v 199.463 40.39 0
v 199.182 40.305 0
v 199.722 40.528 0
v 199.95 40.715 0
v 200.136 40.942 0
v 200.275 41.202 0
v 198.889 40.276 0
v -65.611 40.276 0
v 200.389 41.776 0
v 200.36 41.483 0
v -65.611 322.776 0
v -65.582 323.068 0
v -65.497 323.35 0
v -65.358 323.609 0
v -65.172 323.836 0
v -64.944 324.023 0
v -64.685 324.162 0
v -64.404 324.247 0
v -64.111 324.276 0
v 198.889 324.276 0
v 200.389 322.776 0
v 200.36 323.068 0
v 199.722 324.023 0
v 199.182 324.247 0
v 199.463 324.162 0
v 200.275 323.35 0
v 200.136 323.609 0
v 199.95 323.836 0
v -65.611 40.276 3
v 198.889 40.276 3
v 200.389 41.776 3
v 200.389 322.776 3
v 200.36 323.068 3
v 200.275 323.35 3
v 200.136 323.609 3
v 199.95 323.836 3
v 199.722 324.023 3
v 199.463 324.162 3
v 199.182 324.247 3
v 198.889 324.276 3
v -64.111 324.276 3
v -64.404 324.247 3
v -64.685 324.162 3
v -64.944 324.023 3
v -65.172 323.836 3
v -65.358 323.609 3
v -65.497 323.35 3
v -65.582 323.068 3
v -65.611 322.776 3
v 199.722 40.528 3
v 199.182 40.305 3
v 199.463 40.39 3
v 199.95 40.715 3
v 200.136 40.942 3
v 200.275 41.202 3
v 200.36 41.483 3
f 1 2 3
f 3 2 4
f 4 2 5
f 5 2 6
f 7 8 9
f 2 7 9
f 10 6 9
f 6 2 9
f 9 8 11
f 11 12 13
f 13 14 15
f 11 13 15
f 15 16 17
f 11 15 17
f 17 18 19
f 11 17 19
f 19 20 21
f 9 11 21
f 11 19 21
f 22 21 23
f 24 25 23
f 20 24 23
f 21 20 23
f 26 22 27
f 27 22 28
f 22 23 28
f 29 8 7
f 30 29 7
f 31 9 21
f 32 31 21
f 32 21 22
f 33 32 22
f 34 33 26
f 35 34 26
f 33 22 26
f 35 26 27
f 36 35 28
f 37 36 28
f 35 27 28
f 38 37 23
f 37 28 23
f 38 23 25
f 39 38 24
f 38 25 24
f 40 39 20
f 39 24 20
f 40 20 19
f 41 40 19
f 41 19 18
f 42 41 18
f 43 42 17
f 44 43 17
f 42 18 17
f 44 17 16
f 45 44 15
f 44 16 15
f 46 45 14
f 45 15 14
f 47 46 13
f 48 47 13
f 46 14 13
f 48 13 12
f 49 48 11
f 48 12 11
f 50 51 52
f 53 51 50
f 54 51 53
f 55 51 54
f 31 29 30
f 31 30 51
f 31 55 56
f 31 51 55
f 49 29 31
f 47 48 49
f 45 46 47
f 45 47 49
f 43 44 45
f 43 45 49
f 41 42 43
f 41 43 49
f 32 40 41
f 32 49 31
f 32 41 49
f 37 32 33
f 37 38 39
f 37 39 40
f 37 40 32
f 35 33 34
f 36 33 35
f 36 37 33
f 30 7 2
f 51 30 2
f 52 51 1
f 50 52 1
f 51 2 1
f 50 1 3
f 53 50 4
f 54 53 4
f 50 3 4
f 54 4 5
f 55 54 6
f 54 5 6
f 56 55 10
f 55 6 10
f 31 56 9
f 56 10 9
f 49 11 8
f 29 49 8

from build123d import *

# Parameters (mm, degrees)
EXTRUDE_1_DEPTH = 3


with BuildPart() as part:
    # 草图1 → 凸台-拉伸1 (new body)
    with BuildSketch(Plane.XY):
        with BuildLine():
            Line((-65.611088087, 40.275681374), (198.888911913, 40.275681374))
            ThreePointArc((198.888911913, 40.275681374), (199.949572085, 40.715021202), (200.388911913, 41.775681374))
            Line((200.388911913, 41.775681374), (200.388911913, 322.775681374))
            ThreePointArc((200.388911913, 322.775681374), (199.949572085, 323.836341546), (198.888911913, 324.275681374))
            Line((198.888911913, 324.275681374), (-64.111088087, 324.275681374))
            ThreePointArc((-64.111088087, 324.275681374), (-65.171748259, 323.836341546), (-65.611088087, 322.775681374))
            Line((-65.611088087, 322.775681374), (-65.611088087, 40.275681374))
        make_face()
    extrude(amount=EXTRUDE_1_DEPTH)


solid = part.part
